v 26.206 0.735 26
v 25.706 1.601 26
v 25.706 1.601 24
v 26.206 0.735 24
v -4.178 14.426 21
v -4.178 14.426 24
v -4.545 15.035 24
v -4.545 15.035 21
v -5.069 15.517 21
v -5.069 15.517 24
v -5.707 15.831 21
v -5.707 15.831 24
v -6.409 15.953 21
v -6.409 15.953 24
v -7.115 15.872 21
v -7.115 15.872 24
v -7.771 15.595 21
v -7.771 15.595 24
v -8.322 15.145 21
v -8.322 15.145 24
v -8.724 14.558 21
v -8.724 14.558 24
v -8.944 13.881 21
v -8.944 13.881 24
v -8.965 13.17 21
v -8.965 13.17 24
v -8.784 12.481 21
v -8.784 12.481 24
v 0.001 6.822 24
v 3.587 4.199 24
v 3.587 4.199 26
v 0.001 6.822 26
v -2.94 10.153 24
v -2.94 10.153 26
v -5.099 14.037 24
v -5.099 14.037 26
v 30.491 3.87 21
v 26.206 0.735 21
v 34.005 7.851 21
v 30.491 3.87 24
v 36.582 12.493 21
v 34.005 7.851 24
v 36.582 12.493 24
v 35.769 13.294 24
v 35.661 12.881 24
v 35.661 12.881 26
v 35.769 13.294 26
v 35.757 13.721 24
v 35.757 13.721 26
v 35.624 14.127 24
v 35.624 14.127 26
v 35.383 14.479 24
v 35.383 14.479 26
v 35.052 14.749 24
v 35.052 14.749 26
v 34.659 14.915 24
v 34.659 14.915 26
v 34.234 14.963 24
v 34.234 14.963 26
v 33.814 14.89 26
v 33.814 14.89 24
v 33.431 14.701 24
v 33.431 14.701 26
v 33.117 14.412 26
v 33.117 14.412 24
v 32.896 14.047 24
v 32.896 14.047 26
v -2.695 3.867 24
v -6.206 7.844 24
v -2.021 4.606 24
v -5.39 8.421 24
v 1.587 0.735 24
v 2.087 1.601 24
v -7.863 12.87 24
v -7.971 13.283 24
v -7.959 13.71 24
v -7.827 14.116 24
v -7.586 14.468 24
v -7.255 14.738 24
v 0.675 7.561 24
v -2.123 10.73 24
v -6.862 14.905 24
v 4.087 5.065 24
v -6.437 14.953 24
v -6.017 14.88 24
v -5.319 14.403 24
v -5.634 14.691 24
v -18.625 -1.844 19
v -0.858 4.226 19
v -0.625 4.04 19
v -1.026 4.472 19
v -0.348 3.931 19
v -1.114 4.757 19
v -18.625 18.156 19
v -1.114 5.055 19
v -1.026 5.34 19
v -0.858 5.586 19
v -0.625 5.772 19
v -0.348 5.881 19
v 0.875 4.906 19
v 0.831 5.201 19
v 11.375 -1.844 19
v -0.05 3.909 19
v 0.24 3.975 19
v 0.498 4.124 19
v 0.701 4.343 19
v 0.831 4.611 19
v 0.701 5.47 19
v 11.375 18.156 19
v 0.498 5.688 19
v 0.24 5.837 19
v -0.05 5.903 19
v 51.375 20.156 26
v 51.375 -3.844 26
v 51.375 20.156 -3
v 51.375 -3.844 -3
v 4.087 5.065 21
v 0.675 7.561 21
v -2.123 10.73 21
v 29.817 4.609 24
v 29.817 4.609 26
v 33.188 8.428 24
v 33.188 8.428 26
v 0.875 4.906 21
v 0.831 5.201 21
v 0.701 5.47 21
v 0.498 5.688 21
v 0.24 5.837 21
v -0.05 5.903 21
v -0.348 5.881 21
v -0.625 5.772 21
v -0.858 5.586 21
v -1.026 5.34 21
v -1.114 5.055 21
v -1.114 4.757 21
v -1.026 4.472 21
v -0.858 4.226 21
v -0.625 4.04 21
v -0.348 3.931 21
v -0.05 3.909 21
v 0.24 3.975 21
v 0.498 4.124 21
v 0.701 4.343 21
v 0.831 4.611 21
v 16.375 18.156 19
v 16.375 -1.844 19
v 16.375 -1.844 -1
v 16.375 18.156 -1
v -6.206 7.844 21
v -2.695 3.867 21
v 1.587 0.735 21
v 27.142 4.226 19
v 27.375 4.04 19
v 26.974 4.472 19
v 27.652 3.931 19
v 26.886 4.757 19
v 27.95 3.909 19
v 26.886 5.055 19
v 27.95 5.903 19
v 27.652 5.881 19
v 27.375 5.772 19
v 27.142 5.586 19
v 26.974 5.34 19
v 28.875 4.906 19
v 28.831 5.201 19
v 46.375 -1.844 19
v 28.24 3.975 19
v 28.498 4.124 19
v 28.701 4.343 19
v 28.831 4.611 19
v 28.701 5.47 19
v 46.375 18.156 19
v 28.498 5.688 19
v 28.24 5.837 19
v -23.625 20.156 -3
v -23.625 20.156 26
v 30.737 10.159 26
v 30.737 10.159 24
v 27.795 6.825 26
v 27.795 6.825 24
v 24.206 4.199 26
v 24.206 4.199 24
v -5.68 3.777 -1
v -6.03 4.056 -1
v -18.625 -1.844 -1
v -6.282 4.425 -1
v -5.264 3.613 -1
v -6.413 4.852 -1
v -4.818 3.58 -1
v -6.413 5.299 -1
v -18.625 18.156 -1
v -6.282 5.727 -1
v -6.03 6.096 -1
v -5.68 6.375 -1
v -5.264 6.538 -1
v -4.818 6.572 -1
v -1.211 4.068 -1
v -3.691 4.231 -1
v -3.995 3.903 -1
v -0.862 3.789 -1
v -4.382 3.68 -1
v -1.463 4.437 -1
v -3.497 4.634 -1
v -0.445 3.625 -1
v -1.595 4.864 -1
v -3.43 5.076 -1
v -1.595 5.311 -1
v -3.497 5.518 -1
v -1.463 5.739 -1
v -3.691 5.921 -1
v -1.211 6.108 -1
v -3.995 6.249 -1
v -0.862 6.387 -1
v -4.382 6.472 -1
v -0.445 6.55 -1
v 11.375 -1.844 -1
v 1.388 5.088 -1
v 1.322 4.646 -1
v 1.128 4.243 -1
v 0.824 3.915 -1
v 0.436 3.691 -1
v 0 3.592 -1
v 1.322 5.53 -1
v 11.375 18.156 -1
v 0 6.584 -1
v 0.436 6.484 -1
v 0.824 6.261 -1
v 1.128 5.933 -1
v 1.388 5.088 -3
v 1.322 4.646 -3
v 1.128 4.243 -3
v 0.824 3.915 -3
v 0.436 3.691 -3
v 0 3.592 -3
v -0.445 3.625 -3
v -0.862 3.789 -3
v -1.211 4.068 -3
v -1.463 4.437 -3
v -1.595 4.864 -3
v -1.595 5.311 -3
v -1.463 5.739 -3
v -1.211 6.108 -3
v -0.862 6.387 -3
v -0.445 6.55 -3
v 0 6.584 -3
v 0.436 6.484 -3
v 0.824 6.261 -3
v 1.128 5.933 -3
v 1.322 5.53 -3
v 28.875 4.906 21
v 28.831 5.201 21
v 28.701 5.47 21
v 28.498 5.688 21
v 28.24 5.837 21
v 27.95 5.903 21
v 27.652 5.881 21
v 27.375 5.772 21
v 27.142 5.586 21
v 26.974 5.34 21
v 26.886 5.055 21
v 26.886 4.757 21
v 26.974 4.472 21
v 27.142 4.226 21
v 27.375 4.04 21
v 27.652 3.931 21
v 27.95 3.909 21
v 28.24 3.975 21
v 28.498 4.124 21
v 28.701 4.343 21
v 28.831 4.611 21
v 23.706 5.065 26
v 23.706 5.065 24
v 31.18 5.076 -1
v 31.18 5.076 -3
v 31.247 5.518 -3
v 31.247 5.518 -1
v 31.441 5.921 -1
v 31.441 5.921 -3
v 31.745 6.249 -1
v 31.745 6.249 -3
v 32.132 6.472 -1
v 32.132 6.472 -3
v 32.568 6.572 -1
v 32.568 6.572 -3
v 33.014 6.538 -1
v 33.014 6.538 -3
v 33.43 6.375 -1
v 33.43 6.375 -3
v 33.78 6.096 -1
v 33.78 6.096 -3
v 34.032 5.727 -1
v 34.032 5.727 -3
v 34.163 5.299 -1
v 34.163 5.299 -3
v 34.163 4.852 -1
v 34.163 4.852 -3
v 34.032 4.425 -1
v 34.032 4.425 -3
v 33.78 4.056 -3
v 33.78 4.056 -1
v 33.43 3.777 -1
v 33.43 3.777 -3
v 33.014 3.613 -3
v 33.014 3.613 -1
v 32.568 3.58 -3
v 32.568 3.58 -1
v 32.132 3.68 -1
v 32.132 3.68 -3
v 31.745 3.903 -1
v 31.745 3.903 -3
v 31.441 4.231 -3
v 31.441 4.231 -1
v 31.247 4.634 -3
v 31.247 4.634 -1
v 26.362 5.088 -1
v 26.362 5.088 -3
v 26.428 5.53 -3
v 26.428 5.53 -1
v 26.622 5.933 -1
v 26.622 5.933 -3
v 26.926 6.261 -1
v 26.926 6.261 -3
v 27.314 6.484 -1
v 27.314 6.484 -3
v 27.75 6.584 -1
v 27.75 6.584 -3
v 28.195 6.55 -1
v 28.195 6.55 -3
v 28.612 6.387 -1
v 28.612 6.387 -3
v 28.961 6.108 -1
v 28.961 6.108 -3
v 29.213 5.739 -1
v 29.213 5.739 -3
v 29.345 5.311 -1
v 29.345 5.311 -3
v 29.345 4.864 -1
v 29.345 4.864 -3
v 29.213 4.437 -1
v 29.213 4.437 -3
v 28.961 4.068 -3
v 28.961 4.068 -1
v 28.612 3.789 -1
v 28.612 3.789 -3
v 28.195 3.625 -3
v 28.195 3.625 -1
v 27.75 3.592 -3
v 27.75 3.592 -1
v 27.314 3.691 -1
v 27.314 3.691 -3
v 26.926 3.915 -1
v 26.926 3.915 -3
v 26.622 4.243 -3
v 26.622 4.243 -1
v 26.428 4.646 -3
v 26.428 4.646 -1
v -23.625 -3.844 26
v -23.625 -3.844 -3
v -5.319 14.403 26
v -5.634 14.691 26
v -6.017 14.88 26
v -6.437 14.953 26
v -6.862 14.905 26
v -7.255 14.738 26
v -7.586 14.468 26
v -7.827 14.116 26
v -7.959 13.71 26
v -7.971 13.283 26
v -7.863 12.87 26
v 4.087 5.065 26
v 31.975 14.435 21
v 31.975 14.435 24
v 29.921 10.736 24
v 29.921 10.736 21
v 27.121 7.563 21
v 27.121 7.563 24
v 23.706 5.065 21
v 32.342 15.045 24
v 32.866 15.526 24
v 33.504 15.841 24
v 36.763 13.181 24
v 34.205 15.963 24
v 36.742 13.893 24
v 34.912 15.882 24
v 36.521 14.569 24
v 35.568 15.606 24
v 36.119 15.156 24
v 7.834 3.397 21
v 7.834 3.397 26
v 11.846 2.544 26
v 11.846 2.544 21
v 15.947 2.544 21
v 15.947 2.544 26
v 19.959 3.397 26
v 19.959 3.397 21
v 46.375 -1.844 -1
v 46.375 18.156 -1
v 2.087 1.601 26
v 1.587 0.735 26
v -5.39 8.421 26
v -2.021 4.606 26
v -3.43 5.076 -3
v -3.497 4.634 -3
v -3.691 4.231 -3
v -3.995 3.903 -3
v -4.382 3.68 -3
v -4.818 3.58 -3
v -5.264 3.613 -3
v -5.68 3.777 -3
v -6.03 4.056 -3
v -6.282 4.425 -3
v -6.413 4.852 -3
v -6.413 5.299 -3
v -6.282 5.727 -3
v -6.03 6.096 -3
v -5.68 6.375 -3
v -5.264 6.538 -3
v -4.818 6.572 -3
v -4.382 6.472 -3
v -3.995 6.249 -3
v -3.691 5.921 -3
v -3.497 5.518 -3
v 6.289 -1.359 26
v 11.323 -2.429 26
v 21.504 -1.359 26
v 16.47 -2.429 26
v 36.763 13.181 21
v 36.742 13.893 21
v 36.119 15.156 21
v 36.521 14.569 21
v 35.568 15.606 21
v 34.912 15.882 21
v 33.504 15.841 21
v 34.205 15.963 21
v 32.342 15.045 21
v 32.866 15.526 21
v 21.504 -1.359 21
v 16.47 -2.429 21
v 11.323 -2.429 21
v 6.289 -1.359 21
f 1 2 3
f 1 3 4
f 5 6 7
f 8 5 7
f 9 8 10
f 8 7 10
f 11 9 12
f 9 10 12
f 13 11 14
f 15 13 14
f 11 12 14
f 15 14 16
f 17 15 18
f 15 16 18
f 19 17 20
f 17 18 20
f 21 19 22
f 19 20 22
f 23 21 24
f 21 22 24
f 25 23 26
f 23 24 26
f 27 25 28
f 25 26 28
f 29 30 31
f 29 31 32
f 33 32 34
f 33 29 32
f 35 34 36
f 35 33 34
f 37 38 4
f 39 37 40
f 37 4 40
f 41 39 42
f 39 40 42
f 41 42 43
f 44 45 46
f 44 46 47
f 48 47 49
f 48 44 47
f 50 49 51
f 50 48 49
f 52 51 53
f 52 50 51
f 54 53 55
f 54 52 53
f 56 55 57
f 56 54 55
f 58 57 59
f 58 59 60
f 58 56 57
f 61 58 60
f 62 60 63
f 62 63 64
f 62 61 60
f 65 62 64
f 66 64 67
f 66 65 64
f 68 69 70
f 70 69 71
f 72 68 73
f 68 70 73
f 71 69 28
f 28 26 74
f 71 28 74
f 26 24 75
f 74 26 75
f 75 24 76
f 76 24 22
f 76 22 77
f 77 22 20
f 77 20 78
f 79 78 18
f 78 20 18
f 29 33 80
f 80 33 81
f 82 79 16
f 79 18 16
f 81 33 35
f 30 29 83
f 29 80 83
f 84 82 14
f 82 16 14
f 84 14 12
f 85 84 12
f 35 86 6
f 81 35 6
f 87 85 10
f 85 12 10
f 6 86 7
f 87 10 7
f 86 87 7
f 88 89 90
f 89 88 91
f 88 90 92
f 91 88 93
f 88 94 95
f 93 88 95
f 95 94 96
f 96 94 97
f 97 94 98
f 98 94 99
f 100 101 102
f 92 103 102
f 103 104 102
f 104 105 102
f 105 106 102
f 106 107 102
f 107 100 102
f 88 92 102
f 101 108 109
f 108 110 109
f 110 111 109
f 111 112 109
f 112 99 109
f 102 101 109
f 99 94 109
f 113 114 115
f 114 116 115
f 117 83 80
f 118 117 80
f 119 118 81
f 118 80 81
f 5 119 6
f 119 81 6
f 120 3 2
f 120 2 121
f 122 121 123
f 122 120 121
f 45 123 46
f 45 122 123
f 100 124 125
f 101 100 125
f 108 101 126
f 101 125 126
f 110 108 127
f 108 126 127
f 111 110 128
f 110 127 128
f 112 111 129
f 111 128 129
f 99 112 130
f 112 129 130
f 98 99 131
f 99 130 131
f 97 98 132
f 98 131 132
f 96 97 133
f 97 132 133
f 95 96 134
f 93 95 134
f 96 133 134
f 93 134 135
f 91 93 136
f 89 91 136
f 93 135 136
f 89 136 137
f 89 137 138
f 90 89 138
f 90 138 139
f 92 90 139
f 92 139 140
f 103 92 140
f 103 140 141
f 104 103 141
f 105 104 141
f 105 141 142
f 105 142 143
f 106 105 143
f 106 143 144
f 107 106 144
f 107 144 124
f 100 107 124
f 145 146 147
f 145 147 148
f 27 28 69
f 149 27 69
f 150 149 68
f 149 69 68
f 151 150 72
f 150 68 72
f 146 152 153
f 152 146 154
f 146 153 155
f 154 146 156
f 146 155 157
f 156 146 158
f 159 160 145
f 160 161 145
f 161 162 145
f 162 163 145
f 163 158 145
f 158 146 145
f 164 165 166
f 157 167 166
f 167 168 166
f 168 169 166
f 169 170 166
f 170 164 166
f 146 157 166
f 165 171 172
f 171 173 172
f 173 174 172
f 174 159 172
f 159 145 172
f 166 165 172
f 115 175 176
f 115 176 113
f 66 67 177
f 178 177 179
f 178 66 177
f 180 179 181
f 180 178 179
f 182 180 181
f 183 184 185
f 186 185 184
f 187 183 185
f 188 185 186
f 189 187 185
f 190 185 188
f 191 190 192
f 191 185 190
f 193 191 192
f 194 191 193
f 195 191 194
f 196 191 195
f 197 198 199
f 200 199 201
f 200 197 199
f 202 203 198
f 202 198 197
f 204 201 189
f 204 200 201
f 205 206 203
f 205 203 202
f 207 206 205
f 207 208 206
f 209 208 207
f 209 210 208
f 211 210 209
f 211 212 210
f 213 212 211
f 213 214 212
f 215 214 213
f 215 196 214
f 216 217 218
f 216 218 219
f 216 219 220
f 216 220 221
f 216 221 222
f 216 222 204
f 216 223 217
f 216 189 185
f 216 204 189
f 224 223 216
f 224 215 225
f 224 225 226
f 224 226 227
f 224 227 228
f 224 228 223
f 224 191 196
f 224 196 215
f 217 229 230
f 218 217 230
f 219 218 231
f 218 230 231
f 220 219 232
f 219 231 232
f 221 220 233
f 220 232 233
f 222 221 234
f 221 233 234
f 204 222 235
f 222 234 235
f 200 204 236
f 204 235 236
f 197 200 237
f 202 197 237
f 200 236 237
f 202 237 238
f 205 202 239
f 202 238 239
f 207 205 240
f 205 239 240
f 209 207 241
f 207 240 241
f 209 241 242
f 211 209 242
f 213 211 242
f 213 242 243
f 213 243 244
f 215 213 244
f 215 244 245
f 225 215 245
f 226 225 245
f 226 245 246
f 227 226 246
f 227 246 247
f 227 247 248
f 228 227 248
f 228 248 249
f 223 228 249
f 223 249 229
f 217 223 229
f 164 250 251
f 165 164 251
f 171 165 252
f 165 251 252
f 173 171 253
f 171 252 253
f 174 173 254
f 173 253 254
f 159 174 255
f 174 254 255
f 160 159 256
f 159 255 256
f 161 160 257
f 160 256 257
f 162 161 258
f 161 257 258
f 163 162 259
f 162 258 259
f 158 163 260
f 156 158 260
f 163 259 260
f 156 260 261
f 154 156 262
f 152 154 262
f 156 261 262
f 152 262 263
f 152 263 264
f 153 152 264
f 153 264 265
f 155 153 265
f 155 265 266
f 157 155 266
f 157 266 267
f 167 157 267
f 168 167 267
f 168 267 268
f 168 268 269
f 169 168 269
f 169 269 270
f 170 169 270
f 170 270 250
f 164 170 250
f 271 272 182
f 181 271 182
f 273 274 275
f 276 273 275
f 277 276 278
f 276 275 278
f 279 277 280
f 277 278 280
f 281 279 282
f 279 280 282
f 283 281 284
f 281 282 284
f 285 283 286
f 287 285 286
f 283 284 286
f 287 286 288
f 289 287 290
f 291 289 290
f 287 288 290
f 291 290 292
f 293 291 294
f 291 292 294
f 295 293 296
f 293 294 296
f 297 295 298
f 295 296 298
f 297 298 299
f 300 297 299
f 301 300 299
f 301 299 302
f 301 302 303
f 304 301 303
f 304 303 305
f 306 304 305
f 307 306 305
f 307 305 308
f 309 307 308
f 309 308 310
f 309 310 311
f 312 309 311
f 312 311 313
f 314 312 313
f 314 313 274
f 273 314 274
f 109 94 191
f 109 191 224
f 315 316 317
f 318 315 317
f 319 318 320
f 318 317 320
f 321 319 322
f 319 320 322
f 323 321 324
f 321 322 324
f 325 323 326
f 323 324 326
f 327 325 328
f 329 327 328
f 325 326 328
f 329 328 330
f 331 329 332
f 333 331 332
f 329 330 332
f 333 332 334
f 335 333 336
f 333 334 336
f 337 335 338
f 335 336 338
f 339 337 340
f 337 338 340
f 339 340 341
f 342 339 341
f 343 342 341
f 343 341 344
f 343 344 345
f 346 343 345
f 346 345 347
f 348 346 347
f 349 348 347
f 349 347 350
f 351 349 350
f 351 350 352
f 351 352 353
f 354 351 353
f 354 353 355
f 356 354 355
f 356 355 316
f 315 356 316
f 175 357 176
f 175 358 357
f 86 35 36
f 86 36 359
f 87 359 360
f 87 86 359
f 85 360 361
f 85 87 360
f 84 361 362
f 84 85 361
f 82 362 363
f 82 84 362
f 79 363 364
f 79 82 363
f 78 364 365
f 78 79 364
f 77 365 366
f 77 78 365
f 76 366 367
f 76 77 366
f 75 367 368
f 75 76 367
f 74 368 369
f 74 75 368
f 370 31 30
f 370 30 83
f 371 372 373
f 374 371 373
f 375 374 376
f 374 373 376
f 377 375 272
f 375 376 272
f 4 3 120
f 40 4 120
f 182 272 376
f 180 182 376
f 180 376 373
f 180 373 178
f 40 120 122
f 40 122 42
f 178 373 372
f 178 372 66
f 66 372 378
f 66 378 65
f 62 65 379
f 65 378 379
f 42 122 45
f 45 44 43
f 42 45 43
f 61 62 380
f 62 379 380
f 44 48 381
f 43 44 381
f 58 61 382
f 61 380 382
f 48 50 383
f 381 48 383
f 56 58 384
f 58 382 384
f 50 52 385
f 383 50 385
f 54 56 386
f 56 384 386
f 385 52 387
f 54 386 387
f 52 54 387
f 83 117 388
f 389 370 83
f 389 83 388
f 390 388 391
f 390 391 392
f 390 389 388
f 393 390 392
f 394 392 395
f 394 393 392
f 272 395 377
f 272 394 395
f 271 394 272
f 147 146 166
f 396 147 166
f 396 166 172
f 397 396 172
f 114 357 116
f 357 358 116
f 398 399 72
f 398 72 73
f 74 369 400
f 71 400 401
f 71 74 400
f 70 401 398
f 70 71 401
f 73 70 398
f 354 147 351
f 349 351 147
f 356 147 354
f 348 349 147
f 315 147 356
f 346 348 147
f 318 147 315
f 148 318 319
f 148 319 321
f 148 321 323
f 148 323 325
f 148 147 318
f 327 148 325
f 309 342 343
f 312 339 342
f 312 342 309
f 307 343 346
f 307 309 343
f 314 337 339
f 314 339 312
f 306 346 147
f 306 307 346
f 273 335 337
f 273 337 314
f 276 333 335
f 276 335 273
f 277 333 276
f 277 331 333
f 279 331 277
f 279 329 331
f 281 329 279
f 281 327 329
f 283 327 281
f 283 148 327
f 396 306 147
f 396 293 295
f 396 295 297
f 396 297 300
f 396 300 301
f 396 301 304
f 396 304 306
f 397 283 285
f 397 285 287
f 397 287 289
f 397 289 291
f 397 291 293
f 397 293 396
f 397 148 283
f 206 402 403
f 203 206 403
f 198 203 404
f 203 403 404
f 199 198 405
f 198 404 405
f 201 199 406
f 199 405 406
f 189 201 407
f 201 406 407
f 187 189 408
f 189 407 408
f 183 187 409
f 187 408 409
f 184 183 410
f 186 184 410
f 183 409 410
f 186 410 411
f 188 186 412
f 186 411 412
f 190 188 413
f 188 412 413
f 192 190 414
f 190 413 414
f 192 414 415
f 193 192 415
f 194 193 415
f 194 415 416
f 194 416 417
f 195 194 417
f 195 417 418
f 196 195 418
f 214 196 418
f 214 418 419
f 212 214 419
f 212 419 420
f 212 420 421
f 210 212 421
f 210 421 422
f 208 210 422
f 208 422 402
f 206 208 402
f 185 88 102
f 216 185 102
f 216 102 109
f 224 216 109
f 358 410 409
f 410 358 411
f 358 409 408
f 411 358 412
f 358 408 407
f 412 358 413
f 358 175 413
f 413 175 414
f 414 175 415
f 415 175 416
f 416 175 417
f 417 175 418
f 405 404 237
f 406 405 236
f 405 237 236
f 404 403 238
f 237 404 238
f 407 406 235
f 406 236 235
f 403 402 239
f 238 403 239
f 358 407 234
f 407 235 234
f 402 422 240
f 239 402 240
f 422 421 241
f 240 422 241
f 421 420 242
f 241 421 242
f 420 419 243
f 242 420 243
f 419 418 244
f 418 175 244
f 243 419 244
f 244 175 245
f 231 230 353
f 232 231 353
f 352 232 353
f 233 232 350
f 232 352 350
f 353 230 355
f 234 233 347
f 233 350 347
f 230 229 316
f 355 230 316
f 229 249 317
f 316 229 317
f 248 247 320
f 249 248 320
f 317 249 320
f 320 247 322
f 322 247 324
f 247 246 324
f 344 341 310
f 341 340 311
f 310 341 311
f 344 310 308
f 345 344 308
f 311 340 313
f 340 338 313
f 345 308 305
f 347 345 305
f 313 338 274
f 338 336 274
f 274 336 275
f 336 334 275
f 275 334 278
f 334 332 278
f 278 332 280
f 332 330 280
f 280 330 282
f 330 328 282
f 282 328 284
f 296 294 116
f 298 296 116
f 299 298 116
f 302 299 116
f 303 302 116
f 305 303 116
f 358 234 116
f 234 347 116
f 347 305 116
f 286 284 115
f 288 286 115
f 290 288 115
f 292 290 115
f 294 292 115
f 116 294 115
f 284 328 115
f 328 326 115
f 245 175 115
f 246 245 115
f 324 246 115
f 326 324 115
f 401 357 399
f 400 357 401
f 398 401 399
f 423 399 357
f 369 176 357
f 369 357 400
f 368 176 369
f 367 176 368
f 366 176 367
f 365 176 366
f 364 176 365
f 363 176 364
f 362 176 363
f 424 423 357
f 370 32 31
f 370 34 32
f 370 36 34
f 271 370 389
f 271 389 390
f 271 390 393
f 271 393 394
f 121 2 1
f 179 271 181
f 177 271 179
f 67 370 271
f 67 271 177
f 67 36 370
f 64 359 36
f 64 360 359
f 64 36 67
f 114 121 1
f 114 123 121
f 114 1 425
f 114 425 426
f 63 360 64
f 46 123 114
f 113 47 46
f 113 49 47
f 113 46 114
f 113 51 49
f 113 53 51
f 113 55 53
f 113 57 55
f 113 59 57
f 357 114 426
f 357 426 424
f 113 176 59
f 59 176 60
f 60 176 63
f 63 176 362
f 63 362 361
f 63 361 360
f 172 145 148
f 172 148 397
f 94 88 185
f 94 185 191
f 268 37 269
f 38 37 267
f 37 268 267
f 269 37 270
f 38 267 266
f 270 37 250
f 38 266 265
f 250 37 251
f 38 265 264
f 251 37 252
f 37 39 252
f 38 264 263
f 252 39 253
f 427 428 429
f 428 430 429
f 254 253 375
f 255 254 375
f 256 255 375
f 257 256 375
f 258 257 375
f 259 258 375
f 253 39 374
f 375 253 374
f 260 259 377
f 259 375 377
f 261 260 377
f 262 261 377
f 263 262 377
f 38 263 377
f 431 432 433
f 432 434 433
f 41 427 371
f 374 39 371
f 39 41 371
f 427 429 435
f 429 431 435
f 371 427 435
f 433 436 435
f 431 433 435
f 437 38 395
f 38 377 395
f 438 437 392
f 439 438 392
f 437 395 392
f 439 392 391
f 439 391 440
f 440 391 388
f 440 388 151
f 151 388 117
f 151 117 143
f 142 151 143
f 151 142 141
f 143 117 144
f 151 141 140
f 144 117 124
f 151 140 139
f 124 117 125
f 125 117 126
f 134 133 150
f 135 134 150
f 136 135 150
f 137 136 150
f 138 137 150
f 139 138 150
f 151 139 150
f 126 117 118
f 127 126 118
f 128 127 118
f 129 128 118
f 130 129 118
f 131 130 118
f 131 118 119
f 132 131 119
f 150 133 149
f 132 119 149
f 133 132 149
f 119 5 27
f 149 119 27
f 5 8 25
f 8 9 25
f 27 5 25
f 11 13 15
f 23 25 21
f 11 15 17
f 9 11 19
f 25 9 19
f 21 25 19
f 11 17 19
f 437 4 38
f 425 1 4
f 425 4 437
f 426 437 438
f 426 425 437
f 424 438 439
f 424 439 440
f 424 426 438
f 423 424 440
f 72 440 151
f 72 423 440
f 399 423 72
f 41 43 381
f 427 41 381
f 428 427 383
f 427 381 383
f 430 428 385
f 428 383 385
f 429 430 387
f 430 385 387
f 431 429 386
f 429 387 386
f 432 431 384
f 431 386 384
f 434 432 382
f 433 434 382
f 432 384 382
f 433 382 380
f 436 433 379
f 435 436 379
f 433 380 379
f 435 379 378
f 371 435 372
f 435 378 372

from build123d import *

# Parameters (mm, degrees)
BOSS_EXTRUDE1_DEPTH      = 24
BOSS_EXTRUDE1_DEPTH_BACK = 3
SKETCH1_W                = 75
SKETCH1_H                = 24
CUT_EXTRUDE1_START       = -5
SKETCH2_W                = 30
SKETCH2_H                = 20
CUT_EXTRUDE1_DEPTH       = 20
CUT_EXTRUDE2_DEPTH       = 3
CUT_EXTRUDE3_REACH       = 63.438
SKETCH20_R               = 1
CUT_EXTRUDE4_REACH       = 63.438
SKETCH21_R               = 1.5
SKETCH24_W               = 75
SKETCH24_H               = 24
BOSS_EXTRUDE2_DEPTH      = 2
CUT_EXTRUDE5_DEPTH       = 5


with BuildPart() as part:
    # Sketch1 → Boss-Extrude1 (new, two sides: drawn at the far end of the back side and taken through both)
    with BuildSketch(Plane.XY.offset(-BOSS_EXTRUDE1_DEPTH_BACK)):
        with Locations((13.875, 8.15625)):
            Rectangle(SKETCH1_W, SKETCH1_H)
    extrude(amount=BOSS_EXTRUDE1_DEPTH + BOSS_EXTRUDE1_DEPTH_BACK)

    # Sketch2 → Cut-Extrude1 (cut)
    with BuildSketch(Plane.XY.offset(24).offset(CUT_EXTRUDE1_START)):
        with Locations((-3.625, 8.15625)):
            Rectangle(SKETCH2_W, SKETCH2_H)
        with Locations((31.375, 8.15625)):
            Rectangle(SKETCH2_W, SKETCH2_H)
    extrude(amount=-CUT_EXTRUDE1_DEPTH, mode=Mode.SUBTRACT)

    # Sketch3 → Cut-Extrude2 (cut)
    with BuildSketch(Plane.XY.offset(24)):
        with BuildLine():
            ThreePointArc((-8.784211185, 12.48145261), (13.902958167, -2.563657938), (36.582455444, 12.493015262))
            ThreePointArc((36.582455444, 12.493015262), (35.249734837, 15.767745141), (31.975004957, 14.435024533))
            ThreePointArc((31.975004957, 14.435024533), (13.901683811, 2.436341899), (-4.177751221, 14.425810242))
            ThreePointArc((-4.177751221, 14.425810242), (-7.453160019, 15.756861408), (-8.784211185, 12.48145261))
        make_face()
    extrude(amount=-CUT_EXTRUDE2_DEPTH, mode=Mode.SUBTRACT)

    # Sketch20 → Cut-Extrude3 (cut, up to next)
    with BuildSketch(Plane.XY.offset(24), mode=Mode.PRIVATE) as cut_extrude3_sk1:
        with Locations((27.875, 4.90625)):
            Circle(SKETCH20_R)
    cut_extrude3_tool1 = extrude(cut_extrude3_sk1.sketch, amount=-CUT_EXTRUDE3_REACH, mode=Mode.PRIVATE) & part.part
    # Sketch20 → Cut-Extrude3 (cut, up to next)
    with BuildSketch(Plane.XY.offset(24), mode=Mode.PRIVATE) as cut_extrude3_sk2:
        with Locations((-0.125, 4.90625)):
            Circle(SKETCH20_R)
    cut_extrude3_tool2 = extrude(cut_extrude3_sk2.sketch, amount=-CUT_EXTRUDE3_REACH, mode=Mode.PRIVATE) & part.part
    add(cut_extrude3_tool1.solids().sort_by_distance((27.875, 4.90625, 24))[0], mode=Mode.SUBTRACT)
    add(cut_extrude3_tool2.solids().sort_by_distance((-0.125, 4.90625, 24))[0], mode=Mode.SUBTRACT)

    # Sketch21 → Cut-Extrude4 (cut, up to next)
    with BuildSketch(Plane(origin=(0, 0, -3), x_dir=(-1, 0, 0), z_dir=(0, 0, -1)), mode=Mode.PRIVATE) as cut_extrude4_sk1:
        with Locations((-32.680205402, 5.075855595)):
            Circle(SKETCH21_R)
    cut_extrude4_tool1 = extrude(cut_extrude4_sk1.sketch, amount=-CUT_EXTRUDE4_REACH, mode=Mode.PRIVATE) & part.part
    # Sketch21 → Cut-Extrude4 (cut, up to next)
    with BuildSketch(Plane(origin=(0, 0, -3), x_dir=(-1, 0, 0), z_dir=(0, 0, -1)), mode=Mode.PRIVATE) as cut_extrude4_sk2:
        with Locations((-27.861682335, 5.087799818)):
            Circle(SKETCH21_R)
    cut_extrude4_tool2 = extrude(cut_extrude4_sk2.sketch, amount=-CUT_EXTRUDE4_REACH, mode=Mode.PRIVATE) & part.part
    # Sketch21 → Cut-Extrude4 (cut, up to next)
    with BuildSketch(Plane(origin=(0, 0, -3), x_dir=(-1, 0, 0), z_dir=(0, 0, -1)), mode=Mode.PRIVATE) as cut_extrude4_sk3:
        with Locations(Location((0.111682335, 5.087799818, 0), (0, 0, 180))):
            Circle(SKETCH21_R)
    cut_extrude4_tool3 = extrude(cut_extrude4_sk3.sketch, amount=-CUT_EXTRUDE4_REACH, mode=Mode.PRIVATE) & part.part
    # Sketch21 → Cut-Extrude4 (cut, up to next)
    with BuildSketch(Plane(origin=(0, 0, -3), x_dir=(-1, 0, 0), z_dir=(0, 0, -1)), mode=Mode.PRIVATE) as cut_extrude4_sk4:
        with Locations(Location((4.930205402, 5.075855595, 0), (0, 0, 180))):
            Circle(SKETCH21_R)
    cut_extrude4_tool4 = extrude(cut_extrude4_sk4.sketch, amount=-CUT_EXTRUDE4_REACH, mode=Mode.PRIVATE) & part.part
    add(cut_extrude4_tool1.solids().sort_by_distance((32.680205, 5.075856, -3))[0], mode=Mode.SUBTRACT)
    add(cut_extrude4_tool2.solids().sort_by_distance((27.861682, 5.0878, -3))[0], mode=Mode.SUBTRACT)
    add(cut_extrude4_tool3.solids().sort_by_distance((-0.111682, 5.0878, -3))[0], mode=Mode.SUBTRACT)
    add(cut_extrude4_tool4.solids().sort_by_distance((-4.930205, 5.075856, -3))[0], mode=Mode.SUBTRACT)

    # Sketch24 → Boss-Extrude2 (add)
    with BuildSketch(Plane.XY.offset(24)):
        with Locations((13.875, 8.15625)):
            Rectangle(SKETCH24_W, SKETCH24_H)
        with BuildLine():
            ThreePointArc((-7.862919192, 12.870324137), (13.902703295, -1.563657971), (35.660965347, 12.881417116))
            ThreePointArc((35.660965347, 12.881417116), (34.861332982, 14.846255044), (32.896495055, 14.046622679))
            ThreePointArc((32.896495055, 14.046622679), (13.901938682, 1.436341932), (-5.099043214, 14.036938715))
            ThreePointArc((-5.099043214, 14.036938715), (-7.064288492, 14.835569415), (-7.862919192, 12.870324137))
        make_face(mode=Mode.SUBTRACT)
    extrude(amount=BOSS_EXTRUDE2_DEPTH)

    # Sketch26 → Cut-Extrude5 (cut)
    with BuildSketch(Plane.XY.offset(26)):
        with BuildLine():
            Line((23.705970435, 5.064731747), (26.205970435, 0.734604728))
            ThreePointArc((26.205970435, 0.734604728), (13.896683604, -2.563658738), (1.587396774, 0.734604728))
            Line((1.587396774, 0.734604728), (4.087396774, 5.064731747))
            ThreePointArc((4.087396774, 5.064731747), (13.896683604, 2.436341262), (23.705970435, 5.064731747))
        make_face()
    extrude(amount=-CUT_EXTRUDE5_DEPTH, mode=Mode.SUBTRACT)


solid = part.part
